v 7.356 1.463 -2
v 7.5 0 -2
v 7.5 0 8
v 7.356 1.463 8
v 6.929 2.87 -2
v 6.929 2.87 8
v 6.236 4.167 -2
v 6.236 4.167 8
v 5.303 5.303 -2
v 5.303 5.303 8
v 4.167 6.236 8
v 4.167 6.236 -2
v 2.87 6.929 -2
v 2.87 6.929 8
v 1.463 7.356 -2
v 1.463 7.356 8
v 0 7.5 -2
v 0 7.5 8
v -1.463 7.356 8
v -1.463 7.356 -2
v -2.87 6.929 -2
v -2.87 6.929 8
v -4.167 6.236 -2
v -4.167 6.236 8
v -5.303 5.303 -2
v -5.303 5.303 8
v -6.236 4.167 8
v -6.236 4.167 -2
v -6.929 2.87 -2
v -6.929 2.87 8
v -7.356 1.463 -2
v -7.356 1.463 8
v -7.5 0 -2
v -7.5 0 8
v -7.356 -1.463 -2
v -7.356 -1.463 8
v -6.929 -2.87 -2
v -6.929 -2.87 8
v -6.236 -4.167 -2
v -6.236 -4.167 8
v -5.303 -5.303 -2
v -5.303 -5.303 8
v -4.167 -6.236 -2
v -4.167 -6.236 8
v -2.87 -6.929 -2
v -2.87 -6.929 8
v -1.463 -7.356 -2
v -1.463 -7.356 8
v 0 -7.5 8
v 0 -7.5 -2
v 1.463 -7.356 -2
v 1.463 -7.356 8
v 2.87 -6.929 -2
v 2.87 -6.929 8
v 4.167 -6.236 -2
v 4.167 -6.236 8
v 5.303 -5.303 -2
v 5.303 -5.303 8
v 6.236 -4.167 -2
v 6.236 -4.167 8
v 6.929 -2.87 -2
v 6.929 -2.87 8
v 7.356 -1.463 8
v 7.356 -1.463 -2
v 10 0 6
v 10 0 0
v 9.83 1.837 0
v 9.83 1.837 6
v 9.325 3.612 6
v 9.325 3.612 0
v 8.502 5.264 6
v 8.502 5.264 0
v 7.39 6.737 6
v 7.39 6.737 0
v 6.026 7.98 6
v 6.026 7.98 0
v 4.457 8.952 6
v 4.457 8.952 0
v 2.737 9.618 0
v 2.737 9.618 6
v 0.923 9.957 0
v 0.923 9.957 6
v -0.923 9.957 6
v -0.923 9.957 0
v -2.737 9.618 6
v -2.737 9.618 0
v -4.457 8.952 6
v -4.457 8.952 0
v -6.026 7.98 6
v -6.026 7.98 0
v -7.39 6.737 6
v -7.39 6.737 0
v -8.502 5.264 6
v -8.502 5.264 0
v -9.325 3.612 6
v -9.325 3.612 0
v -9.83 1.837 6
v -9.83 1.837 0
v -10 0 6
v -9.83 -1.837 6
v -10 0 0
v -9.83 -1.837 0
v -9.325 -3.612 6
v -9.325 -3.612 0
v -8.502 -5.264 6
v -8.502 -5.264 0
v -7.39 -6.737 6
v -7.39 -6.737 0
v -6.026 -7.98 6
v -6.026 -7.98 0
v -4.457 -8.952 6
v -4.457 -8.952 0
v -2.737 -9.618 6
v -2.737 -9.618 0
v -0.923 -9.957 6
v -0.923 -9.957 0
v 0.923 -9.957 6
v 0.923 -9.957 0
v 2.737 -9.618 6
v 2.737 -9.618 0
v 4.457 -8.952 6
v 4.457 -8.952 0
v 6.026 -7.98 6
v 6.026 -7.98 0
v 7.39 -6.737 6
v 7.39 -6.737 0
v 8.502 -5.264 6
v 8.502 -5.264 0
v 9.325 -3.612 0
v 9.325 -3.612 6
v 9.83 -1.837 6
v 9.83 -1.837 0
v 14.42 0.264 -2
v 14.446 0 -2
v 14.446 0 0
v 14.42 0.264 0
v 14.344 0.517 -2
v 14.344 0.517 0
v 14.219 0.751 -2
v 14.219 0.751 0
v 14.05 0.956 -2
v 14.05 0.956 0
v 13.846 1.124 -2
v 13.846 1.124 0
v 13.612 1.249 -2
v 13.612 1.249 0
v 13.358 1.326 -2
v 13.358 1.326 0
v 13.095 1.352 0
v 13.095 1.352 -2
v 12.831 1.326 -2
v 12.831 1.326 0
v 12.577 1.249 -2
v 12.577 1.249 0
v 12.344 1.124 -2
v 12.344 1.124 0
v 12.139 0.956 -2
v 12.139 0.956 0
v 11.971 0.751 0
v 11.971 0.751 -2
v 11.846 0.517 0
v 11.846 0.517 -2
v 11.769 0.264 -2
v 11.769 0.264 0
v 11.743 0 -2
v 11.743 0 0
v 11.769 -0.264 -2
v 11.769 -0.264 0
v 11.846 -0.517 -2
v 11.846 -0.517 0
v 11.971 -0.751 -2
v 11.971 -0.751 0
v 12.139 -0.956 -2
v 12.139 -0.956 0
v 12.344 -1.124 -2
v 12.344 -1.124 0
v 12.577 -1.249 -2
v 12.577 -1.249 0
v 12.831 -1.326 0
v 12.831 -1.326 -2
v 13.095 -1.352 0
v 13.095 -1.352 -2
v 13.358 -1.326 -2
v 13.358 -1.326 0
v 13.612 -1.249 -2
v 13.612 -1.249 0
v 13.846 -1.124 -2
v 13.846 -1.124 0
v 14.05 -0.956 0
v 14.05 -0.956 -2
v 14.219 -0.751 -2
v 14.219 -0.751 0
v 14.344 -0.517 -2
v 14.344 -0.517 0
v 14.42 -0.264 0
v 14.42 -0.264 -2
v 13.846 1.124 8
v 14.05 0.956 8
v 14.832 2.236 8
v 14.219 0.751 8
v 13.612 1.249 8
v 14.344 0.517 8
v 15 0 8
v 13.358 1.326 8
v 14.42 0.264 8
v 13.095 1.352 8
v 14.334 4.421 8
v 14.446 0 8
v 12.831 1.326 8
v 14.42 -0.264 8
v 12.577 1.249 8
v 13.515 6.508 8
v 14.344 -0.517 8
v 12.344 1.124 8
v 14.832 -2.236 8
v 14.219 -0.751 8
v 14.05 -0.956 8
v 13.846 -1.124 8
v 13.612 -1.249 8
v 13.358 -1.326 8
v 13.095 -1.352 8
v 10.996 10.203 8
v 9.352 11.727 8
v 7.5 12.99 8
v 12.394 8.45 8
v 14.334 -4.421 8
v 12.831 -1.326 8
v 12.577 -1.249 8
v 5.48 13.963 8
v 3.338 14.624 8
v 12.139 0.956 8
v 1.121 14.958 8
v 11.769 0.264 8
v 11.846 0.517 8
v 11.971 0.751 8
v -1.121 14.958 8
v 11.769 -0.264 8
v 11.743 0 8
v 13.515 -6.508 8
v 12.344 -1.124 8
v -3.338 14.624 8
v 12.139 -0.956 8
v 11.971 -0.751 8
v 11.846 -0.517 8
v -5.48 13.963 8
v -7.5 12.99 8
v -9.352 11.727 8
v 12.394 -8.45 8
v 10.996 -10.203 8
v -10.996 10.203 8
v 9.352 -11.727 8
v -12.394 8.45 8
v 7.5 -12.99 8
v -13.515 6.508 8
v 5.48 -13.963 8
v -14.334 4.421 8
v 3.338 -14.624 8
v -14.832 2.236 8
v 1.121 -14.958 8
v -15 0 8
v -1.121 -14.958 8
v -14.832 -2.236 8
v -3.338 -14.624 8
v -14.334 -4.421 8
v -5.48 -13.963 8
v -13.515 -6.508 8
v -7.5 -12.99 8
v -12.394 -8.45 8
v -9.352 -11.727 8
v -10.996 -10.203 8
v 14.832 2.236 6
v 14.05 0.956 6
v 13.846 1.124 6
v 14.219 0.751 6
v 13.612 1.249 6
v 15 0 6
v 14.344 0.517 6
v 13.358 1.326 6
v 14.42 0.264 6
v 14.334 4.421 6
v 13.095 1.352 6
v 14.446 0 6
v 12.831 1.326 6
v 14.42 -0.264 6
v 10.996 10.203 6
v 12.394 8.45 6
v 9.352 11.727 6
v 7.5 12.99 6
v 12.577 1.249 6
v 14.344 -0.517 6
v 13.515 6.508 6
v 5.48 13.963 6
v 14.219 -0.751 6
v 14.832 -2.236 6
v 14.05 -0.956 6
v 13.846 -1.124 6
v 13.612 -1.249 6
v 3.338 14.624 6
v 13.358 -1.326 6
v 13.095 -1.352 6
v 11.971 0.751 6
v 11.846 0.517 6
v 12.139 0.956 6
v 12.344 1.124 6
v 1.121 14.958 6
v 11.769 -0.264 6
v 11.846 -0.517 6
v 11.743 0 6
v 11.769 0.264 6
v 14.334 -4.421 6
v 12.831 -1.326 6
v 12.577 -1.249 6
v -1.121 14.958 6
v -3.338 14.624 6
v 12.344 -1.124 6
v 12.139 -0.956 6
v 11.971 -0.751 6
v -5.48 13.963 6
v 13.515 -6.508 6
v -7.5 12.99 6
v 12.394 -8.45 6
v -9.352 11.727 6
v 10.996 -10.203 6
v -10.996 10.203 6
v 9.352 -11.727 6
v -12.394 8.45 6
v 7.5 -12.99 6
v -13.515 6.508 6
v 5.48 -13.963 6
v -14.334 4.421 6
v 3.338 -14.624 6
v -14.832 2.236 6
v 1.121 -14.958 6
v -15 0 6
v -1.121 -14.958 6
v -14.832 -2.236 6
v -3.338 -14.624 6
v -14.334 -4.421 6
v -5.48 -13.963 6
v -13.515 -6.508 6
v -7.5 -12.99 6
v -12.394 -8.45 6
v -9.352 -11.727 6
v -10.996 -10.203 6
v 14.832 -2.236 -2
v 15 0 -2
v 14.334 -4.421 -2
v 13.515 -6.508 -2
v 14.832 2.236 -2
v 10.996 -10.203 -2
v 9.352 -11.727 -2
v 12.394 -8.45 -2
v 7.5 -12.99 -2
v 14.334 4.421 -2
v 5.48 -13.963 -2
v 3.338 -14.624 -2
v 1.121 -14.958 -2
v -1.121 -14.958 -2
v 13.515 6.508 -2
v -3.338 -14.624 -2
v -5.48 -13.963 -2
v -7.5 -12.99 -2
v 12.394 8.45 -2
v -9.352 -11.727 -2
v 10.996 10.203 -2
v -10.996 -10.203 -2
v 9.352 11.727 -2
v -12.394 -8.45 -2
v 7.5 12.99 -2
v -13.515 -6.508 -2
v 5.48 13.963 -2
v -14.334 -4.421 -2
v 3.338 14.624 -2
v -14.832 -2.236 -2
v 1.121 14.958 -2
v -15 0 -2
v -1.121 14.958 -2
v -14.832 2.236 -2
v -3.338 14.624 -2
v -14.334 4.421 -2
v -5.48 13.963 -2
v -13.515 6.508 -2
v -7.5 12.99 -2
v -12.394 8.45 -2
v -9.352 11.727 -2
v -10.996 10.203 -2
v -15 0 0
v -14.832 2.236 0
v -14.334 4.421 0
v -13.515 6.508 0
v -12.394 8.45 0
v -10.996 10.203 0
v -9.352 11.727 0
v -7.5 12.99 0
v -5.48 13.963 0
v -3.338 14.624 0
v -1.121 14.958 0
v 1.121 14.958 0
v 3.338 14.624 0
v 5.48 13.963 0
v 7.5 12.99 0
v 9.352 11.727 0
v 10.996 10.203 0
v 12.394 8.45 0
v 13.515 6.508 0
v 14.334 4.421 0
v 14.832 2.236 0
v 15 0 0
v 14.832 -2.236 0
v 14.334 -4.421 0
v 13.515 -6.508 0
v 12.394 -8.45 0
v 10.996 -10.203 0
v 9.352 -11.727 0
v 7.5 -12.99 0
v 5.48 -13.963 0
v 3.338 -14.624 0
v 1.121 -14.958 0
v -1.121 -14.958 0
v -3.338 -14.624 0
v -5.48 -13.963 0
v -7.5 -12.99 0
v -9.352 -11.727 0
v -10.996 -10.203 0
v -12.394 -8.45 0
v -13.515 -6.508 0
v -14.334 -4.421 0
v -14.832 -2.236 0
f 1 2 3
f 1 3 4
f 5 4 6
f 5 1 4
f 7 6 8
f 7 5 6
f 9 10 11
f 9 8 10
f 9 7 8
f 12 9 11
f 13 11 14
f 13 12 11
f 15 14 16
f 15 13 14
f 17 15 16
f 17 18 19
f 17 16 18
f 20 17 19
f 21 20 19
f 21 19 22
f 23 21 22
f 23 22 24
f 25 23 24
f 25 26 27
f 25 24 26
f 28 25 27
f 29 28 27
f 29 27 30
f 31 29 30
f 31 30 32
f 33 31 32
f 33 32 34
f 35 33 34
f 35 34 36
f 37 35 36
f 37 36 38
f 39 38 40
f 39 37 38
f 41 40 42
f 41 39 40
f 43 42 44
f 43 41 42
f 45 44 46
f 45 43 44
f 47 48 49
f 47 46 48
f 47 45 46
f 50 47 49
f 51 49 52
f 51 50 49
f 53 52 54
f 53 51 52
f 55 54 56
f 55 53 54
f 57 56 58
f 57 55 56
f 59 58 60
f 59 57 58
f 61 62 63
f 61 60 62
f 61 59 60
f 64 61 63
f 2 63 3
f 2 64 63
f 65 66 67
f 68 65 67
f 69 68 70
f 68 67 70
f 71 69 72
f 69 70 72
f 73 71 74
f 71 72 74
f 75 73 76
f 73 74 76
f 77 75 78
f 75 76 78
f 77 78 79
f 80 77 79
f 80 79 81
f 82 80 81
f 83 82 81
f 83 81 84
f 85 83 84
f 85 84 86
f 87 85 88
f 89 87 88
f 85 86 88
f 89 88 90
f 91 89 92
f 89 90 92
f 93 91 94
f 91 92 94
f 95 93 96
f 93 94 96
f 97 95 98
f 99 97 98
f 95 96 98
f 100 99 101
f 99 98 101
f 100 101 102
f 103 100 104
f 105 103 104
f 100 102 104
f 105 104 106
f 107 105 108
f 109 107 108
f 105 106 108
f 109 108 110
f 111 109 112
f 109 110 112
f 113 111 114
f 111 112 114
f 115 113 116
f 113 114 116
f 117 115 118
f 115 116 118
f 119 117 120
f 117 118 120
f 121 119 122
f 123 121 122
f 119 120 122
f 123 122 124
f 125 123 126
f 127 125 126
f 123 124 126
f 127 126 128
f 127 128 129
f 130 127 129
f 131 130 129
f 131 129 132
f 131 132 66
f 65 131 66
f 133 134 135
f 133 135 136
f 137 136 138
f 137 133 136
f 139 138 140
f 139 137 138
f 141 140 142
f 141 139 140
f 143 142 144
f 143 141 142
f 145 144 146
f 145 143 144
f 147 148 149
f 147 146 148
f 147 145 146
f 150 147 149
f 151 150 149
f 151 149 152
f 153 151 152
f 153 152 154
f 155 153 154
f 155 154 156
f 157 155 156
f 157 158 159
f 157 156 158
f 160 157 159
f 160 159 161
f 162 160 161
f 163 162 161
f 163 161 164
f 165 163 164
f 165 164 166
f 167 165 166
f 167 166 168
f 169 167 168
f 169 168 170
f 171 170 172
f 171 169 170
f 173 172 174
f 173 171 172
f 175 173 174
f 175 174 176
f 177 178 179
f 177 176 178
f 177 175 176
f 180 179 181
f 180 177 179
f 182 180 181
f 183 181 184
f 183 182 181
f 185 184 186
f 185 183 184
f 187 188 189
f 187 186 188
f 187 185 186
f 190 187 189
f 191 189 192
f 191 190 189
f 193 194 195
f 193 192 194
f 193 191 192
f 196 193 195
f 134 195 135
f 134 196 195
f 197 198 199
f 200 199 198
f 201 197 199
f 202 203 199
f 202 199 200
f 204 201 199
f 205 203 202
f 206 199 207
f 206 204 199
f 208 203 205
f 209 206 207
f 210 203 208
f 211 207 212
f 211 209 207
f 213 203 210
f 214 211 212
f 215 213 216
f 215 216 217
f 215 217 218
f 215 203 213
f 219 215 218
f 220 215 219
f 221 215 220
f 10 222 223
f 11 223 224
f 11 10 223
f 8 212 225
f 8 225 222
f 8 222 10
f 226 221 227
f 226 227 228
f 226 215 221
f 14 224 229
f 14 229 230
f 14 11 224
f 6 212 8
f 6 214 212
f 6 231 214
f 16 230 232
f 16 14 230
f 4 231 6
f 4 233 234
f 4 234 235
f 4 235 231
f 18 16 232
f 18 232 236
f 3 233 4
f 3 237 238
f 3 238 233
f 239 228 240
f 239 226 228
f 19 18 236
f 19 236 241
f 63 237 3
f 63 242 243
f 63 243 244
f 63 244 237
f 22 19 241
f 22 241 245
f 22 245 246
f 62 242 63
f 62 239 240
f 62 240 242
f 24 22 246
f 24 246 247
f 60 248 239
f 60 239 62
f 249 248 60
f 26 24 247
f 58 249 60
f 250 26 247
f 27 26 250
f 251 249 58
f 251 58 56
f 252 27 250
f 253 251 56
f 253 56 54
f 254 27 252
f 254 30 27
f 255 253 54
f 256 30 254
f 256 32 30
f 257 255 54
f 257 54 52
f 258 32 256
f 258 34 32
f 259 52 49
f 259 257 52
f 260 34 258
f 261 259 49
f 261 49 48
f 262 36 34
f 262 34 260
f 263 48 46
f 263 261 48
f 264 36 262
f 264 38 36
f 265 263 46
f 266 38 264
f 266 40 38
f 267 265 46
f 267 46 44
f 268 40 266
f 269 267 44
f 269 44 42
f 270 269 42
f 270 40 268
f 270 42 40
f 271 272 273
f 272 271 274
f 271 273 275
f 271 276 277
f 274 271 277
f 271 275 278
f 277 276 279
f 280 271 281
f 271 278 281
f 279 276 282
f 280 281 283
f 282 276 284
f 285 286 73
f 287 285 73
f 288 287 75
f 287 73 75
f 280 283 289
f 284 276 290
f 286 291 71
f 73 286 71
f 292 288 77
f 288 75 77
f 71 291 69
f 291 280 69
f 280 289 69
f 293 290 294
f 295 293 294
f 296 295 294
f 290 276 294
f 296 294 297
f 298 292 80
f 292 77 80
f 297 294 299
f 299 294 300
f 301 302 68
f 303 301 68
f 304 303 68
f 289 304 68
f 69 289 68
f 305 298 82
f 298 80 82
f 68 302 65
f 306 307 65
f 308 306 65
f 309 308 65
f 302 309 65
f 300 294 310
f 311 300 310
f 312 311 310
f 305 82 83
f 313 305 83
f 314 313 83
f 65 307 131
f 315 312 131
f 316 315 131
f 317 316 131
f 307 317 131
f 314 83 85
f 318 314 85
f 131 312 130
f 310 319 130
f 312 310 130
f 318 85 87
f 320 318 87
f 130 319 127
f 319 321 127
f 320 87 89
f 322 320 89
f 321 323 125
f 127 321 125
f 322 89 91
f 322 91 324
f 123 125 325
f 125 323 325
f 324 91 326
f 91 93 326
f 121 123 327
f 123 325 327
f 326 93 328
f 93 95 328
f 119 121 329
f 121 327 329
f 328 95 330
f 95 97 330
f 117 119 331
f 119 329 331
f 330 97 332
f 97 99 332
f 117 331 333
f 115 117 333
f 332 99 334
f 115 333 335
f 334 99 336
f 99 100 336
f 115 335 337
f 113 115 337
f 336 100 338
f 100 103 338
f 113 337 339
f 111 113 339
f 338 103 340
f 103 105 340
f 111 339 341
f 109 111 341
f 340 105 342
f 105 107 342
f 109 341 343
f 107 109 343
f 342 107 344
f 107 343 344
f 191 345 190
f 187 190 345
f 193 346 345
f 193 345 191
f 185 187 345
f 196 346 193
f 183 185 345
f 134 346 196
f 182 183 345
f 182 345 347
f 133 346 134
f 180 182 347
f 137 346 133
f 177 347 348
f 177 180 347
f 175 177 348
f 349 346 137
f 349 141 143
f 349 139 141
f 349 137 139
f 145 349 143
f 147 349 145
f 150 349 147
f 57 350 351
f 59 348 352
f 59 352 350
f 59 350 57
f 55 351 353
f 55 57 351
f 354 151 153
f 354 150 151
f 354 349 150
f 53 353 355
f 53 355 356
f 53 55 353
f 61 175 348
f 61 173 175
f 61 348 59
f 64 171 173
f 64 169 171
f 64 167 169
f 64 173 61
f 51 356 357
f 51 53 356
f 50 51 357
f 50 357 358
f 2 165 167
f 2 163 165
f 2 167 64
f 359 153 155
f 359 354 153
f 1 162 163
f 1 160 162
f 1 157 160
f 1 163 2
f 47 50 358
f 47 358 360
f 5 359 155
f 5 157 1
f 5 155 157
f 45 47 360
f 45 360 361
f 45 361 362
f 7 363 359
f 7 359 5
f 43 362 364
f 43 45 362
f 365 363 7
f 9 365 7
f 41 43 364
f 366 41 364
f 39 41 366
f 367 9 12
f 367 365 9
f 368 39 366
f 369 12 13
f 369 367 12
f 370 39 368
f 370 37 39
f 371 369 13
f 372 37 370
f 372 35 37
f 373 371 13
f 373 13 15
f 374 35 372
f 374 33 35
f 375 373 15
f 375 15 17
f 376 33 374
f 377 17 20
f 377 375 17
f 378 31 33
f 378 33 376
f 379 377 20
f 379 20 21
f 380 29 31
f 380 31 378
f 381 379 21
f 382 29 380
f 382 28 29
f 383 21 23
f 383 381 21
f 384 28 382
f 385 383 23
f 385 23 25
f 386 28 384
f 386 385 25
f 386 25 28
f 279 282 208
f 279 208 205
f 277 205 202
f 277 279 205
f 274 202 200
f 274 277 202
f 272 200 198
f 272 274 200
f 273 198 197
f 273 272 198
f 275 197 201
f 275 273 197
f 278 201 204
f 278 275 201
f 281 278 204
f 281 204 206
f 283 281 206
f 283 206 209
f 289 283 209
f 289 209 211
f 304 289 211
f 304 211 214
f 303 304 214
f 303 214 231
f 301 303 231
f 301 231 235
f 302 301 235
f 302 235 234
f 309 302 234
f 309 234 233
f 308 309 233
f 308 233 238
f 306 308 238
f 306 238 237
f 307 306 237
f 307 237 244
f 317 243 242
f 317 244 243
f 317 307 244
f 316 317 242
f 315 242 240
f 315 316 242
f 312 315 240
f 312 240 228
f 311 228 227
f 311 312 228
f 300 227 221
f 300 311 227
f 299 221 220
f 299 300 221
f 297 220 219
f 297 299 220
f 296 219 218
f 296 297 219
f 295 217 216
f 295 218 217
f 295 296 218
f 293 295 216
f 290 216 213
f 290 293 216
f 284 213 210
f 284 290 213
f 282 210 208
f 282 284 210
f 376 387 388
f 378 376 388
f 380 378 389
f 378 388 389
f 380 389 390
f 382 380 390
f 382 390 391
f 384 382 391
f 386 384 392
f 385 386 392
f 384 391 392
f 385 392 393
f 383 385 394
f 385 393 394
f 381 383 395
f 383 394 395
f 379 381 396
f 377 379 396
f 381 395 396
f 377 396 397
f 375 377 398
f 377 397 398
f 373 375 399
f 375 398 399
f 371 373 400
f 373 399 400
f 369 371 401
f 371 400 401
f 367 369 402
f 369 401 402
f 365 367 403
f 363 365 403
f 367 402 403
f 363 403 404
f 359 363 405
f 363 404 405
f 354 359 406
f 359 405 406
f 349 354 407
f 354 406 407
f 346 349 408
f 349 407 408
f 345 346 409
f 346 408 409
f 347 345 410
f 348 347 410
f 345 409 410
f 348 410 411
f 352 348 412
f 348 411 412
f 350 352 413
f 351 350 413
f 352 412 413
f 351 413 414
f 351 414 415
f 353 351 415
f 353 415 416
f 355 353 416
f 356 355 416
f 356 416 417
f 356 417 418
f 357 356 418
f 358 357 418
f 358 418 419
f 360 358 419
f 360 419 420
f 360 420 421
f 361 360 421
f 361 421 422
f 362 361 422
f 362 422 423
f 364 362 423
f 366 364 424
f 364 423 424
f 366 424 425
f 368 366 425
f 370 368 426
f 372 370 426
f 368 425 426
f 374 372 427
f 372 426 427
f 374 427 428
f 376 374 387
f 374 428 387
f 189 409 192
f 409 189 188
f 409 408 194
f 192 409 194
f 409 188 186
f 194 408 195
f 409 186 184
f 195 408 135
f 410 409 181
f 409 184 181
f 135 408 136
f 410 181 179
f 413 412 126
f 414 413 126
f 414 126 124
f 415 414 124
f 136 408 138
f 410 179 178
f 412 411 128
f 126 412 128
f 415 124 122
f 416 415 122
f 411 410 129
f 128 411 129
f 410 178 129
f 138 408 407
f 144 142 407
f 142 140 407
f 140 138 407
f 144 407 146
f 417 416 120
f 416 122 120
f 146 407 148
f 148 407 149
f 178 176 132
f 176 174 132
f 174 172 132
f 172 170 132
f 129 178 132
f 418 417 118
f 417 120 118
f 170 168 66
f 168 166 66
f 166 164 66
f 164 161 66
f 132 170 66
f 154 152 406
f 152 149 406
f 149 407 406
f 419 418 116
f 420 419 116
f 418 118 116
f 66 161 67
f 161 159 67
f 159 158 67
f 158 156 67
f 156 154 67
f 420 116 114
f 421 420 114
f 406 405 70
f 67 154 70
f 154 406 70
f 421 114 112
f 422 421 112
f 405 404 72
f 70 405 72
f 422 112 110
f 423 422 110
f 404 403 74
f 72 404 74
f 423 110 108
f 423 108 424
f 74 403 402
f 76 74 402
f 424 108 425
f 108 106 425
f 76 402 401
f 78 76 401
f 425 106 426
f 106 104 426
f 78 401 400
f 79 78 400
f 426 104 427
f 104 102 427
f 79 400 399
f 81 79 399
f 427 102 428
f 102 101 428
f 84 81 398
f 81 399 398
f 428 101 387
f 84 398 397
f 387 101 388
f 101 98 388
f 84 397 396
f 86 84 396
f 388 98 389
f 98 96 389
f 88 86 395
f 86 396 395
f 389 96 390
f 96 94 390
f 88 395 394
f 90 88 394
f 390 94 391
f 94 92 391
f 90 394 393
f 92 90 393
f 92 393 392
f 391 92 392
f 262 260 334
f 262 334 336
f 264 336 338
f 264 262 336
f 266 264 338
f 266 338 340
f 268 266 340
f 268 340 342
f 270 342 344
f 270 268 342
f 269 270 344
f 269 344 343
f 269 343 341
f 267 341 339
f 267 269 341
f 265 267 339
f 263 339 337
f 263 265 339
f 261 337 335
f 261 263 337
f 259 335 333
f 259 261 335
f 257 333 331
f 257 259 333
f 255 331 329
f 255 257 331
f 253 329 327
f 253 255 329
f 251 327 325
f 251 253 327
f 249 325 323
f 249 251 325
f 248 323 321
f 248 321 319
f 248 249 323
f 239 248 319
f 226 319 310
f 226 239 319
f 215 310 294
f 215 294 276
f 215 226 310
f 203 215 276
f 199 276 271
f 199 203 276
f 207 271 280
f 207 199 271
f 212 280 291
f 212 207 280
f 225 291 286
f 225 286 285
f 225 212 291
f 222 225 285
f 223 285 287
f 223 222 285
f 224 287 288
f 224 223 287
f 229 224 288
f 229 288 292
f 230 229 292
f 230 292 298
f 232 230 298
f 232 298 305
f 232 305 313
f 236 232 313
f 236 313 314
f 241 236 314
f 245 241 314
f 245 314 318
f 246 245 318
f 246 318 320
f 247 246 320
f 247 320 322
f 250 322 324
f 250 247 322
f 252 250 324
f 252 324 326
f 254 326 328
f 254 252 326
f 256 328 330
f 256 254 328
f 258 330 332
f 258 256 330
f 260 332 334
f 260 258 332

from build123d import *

# Parameters (mm, degrees)
SKETCH_2_R               = 10
EXTRUDE_1_DEPTH          = 6
SKETCH_3_R               = 15
EXTRUDE_2_DEPTH          = 2
EXTRUDE_START            = 2
SKETCH_4_R               = 15
EXTRUDE_3_DEPTH          = 2
CUT_EXTRUDE_1_DEPTH      = 24.452078799
CUT_EXTRUDE_1_DEPTH_BACK = 24.452078799
SKETCH_5_R               = 7.5
CUT_EXTRUDE_2_DEPTH      = 24.452078799
CUT_EXTRUDE_2_DEPTH_BACK = 24.452078799
SKETCH_6_R               = 1.351786052


with BuildPart() as part:
    # 스케치2 → 보스-돌출1 (new body)
    with BuildSketch(Plane.XY):
        Circle(SKETCH_2_R)
    extrude(amount=EXTRUDE_1_DEPTH)

    # 스케치3 → 보스-돌출2 (add)
    with BuildSketch(Plane(origin=(0, 0, 0), x_dir=(-1, 0, 0), z_dir=(0, 0, -1))):
        Circle(SKETCH_3_R)
    extrude(amount=EXTRUDE_2_DEPTH)

    # 스케치4 → 보스-돌출3 (add)
    with BuildSketch(Plane.XY.offset(6).offset(EXTRUDE_START)):
        with Locations(Location((0, 0, 0), (0, 0, 180))):
            Circle(SKETCH_4_R)
    extrude(amount=-EXTRUDE_3_DEPTH)

    # 스케치5 → 컷-돌출1 (cut, two sides: drawn at the far end of the back side and taken through both)
    with BuildSketch(Plane.XY.offset(8).offset(-CUT_EXTRUDE_1_DEPTH_BACK)):
        Circle(SKETCH_5_R)
    extrude(amount=CUT_EXTRUDE_1_DEPTH + CUT_EXTRUDE_1_DEPTH_BACK, mode=Mode.SUBTRACT)

    # 스케치6 → 컷-돌출2 (cut, two sides: drawn at the far end of the back side and taken through both)
    with BuildSketch(Plane.XY.offset(8).offset(-CUT_EXTRUDE_2_DEPTH_BACK)):
        with Locations((13.094626163, 0)):
            Circle(SKETCH_6_R)
    extrude(amount=CUT_EXTRUDE_2_DEPTH + CUT_EXTRUDE_2_DEPTH_BACK, mode=Mode.SUBTRACT)


solid = part.part
